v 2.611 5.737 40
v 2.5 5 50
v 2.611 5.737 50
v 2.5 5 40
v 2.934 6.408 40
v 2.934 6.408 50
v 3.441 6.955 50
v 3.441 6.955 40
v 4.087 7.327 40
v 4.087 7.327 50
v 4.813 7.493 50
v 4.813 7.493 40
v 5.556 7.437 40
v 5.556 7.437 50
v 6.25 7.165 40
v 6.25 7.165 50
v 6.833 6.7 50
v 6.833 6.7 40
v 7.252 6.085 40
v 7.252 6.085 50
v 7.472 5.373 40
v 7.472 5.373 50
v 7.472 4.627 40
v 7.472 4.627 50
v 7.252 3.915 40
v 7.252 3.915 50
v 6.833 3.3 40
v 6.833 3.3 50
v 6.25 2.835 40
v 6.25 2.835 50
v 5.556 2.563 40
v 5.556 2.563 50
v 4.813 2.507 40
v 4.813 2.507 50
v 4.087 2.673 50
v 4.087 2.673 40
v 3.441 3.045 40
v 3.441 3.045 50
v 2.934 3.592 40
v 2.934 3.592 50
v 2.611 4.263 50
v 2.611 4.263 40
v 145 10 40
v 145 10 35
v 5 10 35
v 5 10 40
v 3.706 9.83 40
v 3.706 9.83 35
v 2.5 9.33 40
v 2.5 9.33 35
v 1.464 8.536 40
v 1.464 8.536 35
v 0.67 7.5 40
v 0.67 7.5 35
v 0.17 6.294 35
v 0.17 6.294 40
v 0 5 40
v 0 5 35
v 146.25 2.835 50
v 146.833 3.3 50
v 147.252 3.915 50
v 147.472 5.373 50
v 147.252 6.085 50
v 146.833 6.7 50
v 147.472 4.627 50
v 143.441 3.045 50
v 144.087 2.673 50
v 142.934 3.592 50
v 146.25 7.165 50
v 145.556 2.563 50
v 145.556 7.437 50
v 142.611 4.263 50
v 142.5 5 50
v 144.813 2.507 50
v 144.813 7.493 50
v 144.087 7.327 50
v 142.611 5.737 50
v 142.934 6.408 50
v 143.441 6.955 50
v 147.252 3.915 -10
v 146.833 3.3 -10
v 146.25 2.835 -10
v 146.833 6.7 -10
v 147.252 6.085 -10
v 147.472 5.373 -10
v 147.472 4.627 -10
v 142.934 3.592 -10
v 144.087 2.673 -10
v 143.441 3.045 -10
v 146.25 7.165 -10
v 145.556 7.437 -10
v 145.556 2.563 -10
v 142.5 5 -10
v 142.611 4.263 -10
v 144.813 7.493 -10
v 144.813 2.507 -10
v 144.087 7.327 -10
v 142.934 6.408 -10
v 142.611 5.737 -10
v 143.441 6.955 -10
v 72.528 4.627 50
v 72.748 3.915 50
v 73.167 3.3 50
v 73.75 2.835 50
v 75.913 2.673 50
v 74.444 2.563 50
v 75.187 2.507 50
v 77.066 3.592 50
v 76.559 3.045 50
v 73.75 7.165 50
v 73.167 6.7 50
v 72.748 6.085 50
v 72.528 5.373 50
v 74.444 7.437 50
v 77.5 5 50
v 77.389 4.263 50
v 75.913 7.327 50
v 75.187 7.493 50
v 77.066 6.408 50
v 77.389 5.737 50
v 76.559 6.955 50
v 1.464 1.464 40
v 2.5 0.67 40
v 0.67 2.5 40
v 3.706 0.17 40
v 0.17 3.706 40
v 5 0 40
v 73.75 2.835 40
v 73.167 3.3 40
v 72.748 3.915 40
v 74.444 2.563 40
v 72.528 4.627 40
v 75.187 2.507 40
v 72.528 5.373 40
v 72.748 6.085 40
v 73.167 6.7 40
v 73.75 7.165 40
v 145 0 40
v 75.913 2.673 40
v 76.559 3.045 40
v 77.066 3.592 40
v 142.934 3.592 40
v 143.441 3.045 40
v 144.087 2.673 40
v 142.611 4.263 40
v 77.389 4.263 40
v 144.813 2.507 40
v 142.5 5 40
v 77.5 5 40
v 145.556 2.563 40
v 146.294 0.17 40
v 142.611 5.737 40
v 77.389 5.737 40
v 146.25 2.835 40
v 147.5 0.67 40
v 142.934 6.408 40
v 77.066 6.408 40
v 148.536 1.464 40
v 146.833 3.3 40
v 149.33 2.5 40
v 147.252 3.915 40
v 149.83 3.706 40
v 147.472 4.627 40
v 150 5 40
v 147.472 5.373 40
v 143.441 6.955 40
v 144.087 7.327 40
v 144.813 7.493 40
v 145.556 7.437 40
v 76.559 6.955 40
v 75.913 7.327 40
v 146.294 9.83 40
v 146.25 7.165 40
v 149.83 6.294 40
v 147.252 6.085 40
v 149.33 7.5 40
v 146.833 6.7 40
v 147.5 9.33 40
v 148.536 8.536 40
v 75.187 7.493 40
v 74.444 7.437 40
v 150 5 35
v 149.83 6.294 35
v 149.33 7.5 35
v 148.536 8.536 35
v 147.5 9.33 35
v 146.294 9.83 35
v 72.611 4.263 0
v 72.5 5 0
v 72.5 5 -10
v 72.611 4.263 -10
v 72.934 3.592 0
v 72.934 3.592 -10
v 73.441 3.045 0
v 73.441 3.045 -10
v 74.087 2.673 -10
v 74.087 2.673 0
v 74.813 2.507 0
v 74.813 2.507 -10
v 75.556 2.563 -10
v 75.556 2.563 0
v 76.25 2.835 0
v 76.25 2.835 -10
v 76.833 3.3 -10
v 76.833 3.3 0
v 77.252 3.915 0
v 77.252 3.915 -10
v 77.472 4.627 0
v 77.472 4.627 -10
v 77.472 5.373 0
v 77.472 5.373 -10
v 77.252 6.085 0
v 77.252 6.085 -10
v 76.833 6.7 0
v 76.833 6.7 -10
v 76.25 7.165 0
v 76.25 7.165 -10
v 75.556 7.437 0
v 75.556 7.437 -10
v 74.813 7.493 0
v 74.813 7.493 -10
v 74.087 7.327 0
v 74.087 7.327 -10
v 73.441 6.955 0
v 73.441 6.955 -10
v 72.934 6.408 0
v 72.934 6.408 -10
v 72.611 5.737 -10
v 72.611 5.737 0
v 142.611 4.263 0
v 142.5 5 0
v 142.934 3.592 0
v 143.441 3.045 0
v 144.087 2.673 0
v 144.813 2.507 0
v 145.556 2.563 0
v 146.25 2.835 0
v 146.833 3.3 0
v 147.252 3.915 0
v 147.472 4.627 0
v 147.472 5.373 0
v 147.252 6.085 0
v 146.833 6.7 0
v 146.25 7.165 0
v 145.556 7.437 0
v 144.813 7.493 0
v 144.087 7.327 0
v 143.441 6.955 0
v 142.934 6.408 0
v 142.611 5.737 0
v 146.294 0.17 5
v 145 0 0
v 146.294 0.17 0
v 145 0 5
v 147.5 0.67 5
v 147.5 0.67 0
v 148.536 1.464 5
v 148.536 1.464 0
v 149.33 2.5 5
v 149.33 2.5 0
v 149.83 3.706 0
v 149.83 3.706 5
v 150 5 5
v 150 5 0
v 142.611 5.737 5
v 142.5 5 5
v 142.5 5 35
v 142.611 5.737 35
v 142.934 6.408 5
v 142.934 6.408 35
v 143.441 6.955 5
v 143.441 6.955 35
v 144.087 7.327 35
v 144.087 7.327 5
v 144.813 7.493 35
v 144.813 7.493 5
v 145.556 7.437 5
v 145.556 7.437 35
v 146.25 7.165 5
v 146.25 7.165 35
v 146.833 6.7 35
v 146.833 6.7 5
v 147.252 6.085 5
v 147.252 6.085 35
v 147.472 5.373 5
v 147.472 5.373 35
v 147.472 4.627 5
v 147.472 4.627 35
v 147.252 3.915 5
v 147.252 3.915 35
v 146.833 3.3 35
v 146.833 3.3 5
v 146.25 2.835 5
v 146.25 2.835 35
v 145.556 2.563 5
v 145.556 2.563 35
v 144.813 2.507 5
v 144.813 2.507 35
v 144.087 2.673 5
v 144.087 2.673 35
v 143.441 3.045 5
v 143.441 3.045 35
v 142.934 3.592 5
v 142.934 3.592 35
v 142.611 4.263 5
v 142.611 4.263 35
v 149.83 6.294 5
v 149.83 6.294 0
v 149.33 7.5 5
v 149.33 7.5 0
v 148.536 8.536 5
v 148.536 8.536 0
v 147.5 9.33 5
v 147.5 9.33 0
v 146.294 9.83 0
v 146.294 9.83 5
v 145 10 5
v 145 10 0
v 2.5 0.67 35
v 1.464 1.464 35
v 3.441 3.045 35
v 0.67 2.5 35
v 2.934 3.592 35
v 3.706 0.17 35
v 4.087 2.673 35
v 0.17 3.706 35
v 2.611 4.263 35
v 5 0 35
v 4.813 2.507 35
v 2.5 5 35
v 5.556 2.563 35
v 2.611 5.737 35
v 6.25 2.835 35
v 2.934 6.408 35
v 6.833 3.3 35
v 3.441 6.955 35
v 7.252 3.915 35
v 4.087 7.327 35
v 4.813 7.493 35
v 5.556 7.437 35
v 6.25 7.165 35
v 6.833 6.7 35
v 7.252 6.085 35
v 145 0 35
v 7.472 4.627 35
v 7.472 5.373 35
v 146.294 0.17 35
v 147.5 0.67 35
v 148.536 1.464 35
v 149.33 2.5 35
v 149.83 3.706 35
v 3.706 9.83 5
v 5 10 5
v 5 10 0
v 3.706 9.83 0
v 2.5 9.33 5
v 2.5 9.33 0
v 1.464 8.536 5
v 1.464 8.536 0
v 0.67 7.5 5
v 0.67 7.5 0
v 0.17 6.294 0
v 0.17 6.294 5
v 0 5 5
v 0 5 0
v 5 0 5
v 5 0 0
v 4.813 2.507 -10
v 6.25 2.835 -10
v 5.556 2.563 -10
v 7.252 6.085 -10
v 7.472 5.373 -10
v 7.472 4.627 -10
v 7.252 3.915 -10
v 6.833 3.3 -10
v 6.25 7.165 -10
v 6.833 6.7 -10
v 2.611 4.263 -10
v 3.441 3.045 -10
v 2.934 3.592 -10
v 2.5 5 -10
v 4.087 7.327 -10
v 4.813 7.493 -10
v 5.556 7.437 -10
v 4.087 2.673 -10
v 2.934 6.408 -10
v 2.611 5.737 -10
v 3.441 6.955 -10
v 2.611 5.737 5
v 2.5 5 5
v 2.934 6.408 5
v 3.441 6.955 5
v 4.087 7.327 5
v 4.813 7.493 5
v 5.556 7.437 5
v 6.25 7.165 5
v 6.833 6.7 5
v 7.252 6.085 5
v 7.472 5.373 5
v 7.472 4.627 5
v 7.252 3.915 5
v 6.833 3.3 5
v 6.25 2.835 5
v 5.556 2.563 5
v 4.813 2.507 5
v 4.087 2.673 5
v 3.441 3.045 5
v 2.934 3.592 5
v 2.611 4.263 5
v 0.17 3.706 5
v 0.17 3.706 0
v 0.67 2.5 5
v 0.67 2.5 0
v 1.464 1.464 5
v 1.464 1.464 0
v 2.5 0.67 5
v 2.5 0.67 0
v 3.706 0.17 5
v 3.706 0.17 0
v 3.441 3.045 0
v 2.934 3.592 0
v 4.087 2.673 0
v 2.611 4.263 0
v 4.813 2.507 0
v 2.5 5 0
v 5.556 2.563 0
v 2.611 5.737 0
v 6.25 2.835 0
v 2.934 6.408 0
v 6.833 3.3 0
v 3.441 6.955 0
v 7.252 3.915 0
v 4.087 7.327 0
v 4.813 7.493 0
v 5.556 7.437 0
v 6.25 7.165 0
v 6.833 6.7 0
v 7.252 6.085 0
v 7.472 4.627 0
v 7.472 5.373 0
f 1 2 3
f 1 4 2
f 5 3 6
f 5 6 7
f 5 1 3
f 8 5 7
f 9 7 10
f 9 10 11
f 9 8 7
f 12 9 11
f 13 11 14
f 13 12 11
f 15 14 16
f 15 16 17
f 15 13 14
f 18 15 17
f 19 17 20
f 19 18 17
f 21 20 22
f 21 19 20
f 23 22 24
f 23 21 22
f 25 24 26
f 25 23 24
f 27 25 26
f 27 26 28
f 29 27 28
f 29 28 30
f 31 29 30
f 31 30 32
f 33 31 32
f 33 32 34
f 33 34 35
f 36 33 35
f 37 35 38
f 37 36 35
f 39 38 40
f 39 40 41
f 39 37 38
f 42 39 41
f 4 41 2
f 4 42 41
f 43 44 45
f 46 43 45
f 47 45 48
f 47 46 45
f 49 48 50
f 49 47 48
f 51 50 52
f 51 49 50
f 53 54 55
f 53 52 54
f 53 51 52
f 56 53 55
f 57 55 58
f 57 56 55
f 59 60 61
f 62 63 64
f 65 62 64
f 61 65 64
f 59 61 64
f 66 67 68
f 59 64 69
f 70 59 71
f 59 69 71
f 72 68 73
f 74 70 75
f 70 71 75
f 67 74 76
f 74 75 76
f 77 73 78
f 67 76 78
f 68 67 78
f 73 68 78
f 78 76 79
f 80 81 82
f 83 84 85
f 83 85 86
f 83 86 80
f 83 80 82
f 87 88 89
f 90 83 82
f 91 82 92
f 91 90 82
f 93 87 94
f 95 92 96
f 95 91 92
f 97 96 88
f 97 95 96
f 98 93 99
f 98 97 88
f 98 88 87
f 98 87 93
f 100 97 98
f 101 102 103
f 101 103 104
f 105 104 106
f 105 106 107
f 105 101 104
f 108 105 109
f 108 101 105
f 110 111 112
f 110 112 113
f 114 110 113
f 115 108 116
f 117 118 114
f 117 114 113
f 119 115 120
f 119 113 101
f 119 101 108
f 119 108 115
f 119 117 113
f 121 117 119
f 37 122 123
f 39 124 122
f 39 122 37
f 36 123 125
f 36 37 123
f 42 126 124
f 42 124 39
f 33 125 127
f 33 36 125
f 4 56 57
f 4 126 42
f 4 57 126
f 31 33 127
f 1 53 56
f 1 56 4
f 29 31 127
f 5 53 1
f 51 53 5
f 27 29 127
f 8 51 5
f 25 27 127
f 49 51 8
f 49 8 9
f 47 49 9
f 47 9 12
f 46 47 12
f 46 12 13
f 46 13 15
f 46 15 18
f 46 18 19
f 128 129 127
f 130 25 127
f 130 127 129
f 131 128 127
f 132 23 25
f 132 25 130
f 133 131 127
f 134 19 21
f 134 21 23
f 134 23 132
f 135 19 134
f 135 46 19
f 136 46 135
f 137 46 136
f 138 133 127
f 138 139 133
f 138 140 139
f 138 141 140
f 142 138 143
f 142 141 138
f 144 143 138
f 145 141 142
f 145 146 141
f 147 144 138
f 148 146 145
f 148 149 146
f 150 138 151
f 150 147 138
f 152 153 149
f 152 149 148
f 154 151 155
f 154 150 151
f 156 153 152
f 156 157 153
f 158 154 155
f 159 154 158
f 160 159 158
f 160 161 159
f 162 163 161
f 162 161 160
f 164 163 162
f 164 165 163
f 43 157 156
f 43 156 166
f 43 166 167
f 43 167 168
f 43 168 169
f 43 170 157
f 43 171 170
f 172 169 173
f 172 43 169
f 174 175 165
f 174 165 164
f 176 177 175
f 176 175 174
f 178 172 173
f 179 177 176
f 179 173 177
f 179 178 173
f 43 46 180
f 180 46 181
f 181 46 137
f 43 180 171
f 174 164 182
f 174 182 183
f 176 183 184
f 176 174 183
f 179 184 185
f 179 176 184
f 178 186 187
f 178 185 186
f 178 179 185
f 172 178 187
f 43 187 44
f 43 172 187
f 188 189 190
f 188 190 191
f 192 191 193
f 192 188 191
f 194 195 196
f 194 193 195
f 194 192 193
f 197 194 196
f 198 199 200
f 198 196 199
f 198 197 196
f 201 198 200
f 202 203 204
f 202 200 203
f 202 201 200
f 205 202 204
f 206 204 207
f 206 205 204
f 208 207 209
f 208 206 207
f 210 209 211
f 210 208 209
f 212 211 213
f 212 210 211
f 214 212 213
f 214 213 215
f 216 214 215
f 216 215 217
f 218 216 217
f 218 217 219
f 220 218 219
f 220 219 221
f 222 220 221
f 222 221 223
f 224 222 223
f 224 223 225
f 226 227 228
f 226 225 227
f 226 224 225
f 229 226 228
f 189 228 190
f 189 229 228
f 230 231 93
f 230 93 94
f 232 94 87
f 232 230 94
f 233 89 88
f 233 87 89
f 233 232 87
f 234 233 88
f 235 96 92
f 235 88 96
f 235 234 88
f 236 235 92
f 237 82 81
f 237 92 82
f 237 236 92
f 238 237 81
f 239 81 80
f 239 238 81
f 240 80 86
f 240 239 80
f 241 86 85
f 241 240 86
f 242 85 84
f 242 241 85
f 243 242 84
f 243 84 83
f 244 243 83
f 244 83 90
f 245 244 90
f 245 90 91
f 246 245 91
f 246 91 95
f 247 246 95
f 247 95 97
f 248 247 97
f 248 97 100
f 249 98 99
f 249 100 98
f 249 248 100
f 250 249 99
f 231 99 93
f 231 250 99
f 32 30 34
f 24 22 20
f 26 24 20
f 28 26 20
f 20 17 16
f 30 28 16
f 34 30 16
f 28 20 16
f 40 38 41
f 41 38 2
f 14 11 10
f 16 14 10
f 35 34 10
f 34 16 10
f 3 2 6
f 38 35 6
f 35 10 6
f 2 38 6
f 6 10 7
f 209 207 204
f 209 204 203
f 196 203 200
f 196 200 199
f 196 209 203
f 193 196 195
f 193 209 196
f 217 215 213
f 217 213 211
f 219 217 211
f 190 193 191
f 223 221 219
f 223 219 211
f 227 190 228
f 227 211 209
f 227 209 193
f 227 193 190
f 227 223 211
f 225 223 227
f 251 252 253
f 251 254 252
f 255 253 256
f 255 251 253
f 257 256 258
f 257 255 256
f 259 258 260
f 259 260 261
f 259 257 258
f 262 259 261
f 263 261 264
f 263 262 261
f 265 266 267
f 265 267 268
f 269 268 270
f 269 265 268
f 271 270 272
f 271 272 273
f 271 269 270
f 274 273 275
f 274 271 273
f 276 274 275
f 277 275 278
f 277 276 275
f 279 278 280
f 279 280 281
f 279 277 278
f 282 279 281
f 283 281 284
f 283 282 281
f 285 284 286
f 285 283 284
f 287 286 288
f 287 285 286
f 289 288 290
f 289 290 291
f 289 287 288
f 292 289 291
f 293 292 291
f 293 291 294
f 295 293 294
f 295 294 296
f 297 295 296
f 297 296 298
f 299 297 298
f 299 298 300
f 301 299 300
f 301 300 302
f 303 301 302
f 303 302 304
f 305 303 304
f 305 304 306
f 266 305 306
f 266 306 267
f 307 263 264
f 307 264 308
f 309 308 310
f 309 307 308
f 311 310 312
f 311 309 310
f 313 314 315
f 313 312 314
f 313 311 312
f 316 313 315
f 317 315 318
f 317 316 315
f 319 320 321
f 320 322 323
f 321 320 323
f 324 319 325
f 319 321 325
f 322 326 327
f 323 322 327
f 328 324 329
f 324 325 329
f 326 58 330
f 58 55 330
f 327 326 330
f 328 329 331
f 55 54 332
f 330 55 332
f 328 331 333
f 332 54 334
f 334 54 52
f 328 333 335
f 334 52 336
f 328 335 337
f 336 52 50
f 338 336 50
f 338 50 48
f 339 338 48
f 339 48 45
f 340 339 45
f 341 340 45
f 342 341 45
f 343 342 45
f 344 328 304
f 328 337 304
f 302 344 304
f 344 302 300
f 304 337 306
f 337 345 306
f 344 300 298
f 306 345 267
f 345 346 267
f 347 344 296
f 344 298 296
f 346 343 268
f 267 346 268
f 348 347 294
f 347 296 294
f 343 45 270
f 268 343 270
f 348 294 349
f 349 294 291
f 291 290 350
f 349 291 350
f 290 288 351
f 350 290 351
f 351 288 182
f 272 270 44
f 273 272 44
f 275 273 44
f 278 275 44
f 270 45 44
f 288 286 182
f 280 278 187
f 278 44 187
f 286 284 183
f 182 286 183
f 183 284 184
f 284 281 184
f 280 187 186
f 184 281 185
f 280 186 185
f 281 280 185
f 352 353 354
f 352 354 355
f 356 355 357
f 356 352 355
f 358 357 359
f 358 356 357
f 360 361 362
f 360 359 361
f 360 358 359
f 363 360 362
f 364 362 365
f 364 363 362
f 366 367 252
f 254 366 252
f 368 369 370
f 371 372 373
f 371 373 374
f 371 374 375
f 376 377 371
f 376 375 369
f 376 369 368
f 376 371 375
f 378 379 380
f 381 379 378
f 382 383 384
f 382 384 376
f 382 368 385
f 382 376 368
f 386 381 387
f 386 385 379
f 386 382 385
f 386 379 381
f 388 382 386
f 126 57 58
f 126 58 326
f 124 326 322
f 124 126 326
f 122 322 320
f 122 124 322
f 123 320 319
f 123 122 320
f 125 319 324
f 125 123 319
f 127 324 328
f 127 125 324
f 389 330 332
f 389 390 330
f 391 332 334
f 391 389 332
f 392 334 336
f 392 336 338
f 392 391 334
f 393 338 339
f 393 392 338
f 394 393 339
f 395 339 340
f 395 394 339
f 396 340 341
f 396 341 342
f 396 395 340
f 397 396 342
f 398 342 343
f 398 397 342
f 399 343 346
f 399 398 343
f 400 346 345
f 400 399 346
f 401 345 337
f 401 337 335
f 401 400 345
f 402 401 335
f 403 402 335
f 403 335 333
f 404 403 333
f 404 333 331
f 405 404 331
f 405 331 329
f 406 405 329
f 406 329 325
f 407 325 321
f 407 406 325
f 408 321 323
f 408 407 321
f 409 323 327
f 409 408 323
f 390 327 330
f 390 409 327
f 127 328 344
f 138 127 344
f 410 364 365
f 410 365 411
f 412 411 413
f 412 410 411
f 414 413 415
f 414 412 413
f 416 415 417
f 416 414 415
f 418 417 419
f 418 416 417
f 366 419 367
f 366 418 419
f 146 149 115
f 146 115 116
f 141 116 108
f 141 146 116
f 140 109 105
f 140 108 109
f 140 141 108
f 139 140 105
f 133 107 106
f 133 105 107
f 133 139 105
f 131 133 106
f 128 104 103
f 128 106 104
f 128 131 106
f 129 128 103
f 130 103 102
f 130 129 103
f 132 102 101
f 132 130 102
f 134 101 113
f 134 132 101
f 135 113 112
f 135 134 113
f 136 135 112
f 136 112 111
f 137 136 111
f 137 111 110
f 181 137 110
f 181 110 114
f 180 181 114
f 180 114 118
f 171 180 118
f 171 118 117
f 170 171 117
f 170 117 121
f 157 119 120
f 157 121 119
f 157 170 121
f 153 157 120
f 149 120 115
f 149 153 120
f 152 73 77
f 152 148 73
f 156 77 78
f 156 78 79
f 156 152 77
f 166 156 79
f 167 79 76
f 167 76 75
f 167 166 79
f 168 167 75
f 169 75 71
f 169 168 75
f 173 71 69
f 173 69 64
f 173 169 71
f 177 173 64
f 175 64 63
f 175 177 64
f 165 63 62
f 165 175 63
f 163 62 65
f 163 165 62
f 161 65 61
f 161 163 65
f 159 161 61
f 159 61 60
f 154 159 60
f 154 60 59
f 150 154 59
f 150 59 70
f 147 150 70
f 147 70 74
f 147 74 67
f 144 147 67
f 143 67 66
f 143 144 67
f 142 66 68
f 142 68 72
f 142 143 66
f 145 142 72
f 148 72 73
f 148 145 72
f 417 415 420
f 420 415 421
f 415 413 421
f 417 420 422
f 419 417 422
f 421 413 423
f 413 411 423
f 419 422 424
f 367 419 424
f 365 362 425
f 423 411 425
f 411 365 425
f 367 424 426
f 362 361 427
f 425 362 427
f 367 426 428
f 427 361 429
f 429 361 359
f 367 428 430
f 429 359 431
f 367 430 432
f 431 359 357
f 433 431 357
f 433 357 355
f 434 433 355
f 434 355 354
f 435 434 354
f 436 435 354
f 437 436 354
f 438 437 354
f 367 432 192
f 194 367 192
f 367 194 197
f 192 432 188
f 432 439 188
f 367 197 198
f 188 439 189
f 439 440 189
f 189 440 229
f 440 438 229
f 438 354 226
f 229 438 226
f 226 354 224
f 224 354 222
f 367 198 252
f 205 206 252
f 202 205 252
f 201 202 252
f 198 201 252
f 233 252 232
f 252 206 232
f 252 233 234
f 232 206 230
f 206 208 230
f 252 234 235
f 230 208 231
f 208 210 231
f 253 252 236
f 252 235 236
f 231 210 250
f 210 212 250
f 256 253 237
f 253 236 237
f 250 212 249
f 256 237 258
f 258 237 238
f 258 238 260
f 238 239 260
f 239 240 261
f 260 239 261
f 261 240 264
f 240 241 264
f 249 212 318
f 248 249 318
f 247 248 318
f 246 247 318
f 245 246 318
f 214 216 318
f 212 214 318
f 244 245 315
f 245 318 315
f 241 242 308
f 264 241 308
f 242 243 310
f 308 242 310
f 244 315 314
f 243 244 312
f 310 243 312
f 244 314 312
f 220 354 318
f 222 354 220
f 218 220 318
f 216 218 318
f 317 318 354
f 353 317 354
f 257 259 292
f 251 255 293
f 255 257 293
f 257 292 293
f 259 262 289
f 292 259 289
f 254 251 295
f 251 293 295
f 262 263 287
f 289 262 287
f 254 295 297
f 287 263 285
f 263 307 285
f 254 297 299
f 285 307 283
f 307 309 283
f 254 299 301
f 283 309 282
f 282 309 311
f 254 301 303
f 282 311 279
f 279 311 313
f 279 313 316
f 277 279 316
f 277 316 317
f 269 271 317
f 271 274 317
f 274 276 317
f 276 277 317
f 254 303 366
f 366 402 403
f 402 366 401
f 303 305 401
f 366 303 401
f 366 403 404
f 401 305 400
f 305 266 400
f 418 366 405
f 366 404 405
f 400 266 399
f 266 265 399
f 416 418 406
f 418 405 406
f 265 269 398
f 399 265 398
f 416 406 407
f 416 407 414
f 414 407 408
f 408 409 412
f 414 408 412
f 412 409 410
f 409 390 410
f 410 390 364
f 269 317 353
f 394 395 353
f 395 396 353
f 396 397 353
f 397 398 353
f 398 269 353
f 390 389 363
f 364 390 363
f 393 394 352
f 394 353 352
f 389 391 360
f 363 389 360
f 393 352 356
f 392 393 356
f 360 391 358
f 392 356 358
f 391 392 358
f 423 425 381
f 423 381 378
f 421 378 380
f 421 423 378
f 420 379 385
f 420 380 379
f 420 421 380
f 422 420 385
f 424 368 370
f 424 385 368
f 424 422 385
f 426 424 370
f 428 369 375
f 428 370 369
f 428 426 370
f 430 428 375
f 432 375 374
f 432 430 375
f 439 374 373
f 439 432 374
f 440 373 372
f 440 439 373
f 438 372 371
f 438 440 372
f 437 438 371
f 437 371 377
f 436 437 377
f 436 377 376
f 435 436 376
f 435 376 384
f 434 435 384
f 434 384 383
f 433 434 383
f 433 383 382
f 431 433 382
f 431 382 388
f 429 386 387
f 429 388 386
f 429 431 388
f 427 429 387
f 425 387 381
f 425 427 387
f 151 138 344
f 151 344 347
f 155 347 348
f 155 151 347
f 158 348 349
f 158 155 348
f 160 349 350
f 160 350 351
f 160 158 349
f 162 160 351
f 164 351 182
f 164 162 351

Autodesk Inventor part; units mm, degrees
ref_plane "YZ Plane" through (0, 0, 0) normal (1, 0, 0) x (0, 1, 0)
ref_plane "XZ Plane" through (0, 0, 0) normal (0, 1, 0) x (-1, 0, 0)
ref_plane "XY Plane" through (0, 0, 0) normal (0, 0, 1) x (1, 0, 0)
sketch "Sketch1" plane through (0, 0, 0) normal (0, 0, 1) x (1, 0, 0)
  line L0 (0, 0) -> (150, 0)
  line L1 (150, 0) -> (150, 10)
  line L2 (150, 10) -> (0, 10)
  line L3 (0, 10) -> (0, 0)
  dimension "d0" = 10
  dimension "d1" = 150
extrude "Extrusion1" add sketch "Sketch1" along normal blind 40
sketch "Sketch2" plane through (0, 10, 0) normal (0, 1, 0) x (1, 0, 0)
  line L0 (0, -35) -> (150, -35)
  line L1 (150, -35) -> (150, -5)
  line L2 (150, -5) -> (0, -5)
  line L3 (0, -5) -> (0, -35)
  line L4 (0, 0) -> (0, -40) projected
  line L5 (150, 0) -> (150, -40) projected
  line L6 (150, 0) -> (0, 0) projected
  line L7 (150, -40) -> (0, -40) projected
  dimension "d4" = 0
  dimension "d5" = 0
  dimension "d6" = 5
  dimension "d7" = 5
extrude "Extrusion2" cut sketch "Sketch2" against normal blind 10 contours L3 L2 L1 L0
sketch "Sketch3" plane through (0, 10, 5) normal (0, 0, 1) x (1, 0, 0)
  point P0 (0, -10)
sketch "Sketch4" plane through (0, 0, 0) normal (0, 0, -1) x (-1, 0, 0)
  circle A0 centre (-5, 5) radius 2.5
  circle A1 centre (-145, 5) radius 2.5
  line L0 (-150, 0) -> (-150, 10) projected
  line L1 (0, 0) -> (-150, 0) projected
  line L2 (-150, 10) -> (0, 10) projected
  line L3 (0, 10) -> (0, 0) projected
  circle A2 centre (-75, 5) radius 2.5
  dimension "d10" = 5
  dimension "d11" = 5
  dimension "d12" = 5
  dimension "d13" = 5
  dimension "d14" = 5
  dimension "d15" = 5
  dimension "d21" = 70
  dimension "d22" = 5
  dimension "d23" = 5
extrude "Extrusion3" add sketch "Sketch4" along normal blind 10 and the other way blind 50 contours A0 | A1
fillet "Fillet1" radius 5 8 edges at (150, 10, 37.5) (150, 10, 2.5) (0, 10, 37.5) (0, 10, 2.5) (150, 0, 37.5) (150, 0, 2.5) (0, 0, 37.5) (0, 0, 2.5)
extrude "Extrusion4" add sketch "Sketch4" along normal blind 10 contours A2
sketch "Sketch5" plane through (0, 0, 40) normal (0, 0, 1) x (1, 0, 0)
  circle A0 centre (75, 5) radius 2.5
  circle A1 centre (5, 5) radius 2.5 projected
  line L0 (5, 0) -> (145, 0) projected
  point P0 (0, 0)
  dimension "d26" = 70
  dimension "d27" = 5
  dimension "d28" = 5
extrude "Extrusion5" add sketch "Sketch5" along normal blind 10 contours A0
properties part number "Joint 2"
